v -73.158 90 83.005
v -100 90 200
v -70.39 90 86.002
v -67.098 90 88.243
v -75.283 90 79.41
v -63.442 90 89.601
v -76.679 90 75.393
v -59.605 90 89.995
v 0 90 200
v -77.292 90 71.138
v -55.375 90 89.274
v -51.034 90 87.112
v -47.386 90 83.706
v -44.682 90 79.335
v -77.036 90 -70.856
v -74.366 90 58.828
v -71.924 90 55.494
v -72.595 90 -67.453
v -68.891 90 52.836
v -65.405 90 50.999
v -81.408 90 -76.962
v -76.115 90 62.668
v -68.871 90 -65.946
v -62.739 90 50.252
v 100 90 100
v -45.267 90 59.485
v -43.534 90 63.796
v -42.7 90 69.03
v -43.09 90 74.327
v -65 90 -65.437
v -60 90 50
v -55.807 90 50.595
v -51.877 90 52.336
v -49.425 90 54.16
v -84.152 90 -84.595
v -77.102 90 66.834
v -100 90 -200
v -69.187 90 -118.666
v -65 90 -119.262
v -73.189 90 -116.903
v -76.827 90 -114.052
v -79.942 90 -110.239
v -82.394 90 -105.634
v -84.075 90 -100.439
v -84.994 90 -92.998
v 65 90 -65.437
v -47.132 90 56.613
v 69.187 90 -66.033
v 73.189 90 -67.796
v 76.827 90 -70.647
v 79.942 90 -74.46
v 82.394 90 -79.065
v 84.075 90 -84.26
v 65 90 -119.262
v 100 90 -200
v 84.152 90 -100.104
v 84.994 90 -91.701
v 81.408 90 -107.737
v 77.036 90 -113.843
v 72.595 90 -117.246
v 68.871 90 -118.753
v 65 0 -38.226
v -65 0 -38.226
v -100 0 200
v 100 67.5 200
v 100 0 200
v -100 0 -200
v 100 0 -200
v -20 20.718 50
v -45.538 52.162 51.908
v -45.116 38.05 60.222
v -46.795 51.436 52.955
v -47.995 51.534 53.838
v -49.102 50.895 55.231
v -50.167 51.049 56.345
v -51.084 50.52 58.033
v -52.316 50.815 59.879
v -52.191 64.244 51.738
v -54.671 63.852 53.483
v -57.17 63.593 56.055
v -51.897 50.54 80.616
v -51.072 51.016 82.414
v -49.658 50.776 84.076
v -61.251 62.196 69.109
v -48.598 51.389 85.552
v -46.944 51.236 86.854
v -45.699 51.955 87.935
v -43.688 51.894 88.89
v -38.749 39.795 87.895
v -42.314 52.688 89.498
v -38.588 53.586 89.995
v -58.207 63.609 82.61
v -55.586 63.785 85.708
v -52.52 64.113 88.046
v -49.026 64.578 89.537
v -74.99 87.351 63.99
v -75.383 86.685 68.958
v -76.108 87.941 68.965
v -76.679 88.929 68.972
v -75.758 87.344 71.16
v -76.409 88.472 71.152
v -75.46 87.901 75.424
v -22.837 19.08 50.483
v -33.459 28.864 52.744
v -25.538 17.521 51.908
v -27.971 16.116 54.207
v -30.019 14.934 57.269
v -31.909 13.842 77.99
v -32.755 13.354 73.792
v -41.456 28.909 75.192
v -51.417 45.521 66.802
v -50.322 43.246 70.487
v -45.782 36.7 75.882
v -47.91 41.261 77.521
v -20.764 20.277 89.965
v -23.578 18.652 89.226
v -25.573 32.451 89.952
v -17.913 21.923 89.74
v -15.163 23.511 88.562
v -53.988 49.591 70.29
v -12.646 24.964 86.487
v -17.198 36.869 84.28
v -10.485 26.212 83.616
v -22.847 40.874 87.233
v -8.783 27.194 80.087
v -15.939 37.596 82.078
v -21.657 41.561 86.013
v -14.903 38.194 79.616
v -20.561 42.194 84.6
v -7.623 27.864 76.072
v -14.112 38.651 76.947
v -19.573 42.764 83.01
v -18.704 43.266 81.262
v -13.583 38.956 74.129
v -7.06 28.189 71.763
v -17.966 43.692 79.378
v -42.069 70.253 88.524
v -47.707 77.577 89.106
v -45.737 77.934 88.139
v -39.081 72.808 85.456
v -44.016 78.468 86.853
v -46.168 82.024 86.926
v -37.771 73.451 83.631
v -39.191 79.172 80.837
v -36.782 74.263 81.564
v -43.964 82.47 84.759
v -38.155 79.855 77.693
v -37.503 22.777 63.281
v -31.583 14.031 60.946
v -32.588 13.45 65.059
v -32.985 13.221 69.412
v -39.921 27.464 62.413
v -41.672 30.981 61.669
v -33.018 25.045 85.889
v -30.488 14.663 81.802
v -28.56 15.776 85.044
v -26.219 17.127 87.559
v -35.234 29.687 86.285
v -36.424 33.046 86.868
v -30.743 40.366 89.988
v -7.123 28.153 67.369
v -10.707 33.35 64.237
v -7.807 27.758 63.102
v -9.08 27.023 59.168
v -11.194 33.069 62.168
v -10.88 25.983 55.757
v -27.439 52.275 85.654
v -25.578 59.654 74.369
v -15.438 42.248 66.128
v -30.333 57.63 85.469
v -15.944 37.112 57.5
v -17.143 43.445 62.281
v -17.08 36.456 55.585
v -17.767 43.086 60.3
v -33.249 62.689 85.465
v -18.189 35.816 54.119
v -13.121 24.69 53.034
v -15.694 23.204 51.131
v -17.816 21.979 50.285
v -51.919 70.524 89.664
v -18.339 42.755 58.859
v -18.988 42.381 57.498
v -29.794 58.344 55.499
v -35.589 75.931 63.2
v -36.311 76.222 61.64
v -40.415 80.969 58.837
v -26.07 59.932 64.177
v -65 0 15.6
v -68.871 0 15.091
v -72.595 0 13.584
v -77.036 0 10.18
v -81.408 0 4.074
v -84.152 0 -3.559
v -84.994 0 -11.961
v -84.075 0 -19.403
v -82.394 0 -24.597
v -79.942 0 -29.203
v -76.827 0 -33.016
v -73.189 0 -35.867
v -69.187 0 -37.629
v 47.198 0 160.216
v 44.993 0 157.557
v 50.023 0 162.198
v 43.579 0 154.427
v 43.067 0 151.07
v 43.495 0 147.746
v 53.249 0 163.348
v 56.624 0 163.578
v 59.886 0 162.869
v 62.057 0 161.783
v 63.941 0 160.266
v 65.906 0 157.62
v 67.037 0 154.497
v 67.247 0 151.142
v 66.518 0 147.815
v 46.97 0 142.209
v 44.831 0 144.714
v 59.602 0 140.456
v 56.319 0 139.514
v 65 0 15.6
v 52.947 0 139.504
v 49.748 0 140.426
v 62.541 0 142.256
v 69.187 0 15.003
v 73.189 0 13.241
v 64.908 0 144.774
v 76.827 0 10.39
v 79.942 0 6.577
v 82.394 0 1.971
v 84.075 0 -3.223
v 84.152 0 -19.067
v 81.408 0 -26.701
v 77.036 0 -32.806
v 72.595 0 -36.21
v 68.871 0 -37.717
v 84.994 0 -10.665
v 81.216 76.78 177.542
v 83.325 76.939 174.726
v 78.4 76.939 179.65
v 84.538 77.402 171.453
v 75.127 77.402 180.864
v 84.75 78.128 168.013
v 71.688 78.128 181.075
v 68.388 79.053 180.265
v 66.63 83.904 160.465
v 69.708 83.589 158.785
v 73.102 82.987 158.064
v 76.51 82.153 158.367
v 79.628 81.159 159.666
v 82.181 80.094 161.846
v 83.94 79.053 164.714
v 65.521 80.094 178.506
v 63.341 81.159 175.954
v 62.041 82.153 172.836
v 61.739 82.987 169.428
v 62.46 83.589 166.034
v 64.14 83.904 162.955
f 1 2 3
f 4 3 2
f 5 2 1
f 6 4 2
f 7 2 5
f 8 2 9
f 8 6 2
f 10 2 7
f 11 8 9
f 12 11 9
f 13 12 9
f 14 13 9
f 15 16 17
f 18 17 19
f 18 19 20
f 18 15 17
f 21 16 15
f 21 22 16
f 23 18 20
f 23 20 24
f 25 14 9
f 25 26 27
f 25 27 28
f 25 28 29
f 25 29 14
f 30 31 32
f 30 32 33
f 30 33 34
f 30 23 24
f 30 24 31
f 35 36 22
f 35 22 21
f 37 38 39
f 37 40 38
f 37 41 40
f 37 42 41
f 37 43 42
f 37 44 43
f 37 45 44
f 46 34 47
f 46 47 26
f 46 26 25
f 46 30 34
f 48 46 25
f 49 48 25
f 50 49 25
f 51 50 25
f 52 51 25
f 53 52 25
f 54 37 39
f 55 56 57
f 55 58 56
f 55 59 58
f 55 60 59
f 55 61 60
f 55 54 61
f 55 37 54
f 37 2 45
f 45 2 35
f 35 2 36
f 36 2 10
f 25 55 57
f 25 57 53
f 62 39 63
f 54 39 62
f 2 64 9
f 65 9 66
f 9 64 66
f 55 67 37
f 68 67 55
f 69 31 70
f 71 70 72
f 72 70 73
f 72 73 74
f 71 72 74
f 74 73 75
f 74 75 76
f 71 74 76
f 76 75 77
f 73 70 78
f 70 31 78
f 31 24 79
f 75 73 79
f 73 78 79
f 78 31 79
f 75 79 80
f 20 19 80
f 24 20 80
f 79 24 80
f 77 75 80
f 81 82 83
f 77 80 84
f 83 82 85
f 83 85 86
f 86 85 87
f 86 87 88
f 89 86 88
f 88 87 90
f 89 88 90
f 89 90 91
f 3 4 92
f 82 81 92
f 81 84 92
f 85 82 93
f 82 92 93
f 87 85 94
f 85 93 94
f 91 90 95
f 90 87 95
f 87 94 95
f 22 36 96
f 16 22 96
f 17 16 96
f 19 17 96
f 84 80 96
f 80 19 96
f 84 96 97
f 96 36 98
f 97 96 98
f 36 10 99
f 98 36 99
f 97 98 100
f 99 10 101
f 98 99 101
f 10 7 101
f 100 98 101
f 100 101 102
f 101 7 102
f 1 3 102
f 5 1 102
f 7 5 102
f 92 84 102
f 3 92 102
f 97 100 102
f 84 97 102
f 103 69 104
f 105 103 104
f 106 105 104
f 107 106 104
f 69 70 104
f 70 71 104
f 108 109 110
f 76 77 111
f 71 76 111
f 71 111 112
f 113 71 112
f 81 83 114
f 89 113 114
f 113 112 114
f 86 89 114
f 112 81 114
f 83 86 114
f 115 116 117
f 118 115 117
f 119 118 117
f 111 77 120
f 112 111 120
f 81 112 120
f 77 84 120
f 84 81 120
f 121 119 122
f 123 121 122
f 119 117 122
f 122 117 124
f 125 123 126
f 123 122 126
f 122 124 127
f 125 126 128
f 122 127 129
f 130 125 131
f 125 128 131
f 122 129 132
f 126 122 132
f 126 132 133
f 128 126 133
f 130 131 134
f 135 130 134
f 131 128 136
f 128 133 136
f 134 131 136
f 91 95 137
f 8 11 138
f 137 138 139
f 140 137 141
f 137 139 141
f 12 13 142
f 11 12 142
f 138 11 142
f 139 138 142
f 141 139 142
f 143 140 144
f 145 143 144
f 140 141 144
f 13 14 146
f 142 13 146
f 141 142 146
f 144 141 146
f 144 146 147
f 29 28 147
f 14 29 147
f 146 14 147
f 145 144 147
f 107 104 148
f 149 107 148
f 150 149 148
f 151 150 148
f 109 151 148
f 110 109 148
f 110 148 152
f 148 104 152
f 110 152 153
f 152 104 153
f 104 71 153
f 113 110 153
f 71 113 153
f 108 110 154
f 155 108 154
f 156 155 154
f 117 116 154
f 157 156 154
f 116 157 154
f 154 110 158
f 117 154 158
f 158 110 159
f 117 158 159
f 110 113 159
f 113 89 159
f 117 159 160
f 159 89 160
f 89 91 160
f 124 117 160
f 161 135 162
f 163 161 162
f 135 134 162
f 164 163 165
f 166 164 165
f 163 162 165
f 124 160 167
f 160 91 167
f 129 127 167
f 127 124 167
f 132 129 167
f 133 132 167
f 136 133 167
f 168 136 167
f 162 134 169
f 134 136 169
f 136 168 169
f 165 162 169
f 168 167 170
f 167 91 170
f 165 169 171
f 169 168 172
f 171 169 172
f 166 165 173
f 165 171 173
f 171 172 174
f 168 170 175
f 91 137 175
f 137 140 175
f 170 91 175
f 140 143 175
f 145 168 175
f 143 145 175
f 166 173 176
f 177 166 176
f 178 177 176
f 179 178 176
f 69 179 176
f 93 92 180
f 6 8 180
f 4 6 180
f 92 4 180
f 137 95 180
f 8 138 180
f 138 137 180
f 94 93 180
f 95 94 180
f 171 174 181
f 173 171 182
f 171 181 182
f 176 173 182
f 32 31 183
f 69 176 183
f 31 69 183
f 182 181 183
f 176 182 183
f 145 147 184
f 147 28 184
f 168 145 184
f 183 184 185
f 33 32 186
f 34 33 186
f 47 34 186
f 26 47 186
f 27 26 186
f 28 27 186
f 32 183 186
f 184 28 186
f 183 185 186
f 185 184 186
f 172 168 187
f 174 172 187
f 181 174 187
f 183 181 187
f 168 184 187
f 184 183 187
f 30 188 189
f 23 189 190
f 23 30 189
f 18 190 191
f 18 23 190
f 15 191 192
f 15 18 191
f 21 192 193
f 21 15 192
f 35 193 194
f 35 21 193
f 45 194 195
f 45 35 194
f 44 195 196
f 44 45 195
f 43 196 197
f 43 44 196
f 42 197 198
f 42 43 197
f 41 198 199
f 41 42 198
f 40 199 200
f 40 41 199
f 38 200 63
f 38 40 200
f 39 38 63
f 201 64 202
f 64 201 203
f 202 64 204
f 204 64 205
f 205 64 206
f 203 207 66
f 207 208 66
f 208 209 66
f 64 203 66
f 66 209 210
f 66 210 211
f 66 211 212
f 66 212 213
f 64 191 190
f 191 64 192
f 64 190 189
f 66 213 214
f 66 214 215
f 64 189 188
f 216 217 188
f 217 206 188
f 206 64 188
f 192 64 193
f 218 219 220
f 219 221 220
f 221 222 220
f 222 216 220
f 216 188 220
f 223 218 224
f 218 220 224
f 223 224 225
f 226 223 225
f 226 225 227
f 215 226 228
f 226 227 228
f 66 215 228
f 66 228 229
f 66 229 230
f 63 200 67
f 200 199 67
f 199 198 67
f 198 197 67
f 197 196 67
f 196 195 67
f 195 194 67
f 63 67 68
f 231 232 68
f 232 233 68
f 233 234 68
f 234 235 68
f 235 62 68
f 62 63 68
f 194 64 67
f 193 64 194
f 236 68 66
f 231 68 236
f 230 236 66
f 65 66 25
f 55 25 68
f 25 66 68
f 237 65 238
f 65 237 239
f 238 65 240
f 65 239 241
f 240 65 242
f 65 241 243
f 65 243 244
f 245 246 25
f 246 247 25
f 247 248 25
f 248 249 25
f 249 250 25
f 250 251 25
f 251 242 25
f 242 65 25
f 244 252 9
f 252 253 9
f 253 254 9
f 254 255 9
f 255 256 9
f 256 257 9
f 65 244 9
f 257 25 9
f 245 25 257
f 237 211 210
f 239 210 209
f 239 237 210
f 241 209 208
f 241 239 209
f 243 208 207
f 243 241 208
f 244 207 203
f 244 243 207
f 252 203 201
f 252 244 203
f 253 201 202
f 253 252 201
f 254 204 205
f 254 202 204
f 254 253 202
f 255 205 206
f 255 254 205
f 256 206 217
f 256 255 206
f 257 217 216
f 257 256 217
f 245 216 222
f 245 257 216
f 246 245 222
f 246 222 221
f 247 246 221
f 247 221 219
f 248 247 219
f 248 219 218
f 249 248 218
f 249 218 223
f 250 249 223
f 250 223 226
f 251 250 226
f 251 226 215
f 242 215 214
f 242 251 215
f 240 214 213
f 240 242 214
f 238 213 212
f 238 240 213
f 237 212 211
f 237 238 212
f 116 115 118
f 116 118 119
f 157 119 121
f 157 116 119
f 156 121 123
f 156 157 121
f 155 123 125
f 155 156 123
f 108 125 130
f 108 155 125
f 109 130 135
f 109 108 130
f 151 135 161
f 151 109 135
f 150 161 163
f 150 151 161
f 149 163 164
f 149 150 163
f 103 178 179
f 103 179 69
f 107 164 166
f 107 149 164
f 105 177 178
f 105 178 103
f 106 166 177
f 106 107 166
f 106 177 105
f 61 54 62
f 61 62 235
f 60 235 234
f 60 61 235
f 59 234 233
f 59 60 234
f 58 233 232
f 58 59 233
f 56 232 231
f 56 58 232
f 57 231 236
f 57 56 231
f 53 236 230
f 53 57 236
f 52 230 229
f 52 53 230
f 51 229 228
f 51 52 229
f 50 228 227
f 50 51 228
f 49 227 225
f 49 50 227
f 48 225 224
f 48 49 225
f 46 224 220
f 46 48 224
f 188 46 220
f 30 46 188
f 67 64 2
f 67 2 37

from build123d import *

# Parameters (mm, degrees)
SKETCH1_W           = 200
SKETCH1_H           = 400
BOSS_EXTRUDE1_DEPTH = 90
CUT_EXTRUDE2_DEPTH  = 289.26854046
SKETCH4_3_R         = 11.813497964
CUT_EXTRUDE4_DEPTH  = 289.26854046
SKETCH10_RX         = 20
SKETCH10_RY         = 15
CUT_EXTRUDE5_DEPTH  = 100
CUT_EXTRUDE6_DEPTH  = 380.479144091


with BuildPart() as part:
    # Sketch1 → Boss-Extrude1 (new body)
    with BuildSketch(Plane(origin=(0, 0, 0), x_dir=(1, 0, 0), z_dir=(0, 1, 0))):
        Rectangle(SKETCH1_W, SKETCH1_H)
    extrude(amount=BOSS_EXTRUDE1_DEPTH)

    # Sketch4 → Cut-Extrude2 (cut, through all)
    with BuildSketch(Plane(origin=(27.582292849, 122.587968218, 27.582292849), x_dir=(-0.9767443431718839, 0.20917784862693525, 0.04706501594106042), z_dir=(-0.21440729484260865, -0.9529213104115941, -0.21440729484260865))):
        Polygon((28.239009565, -175.365853659), (-74.141926347, -77.804878049), (-74.141926347, -180.304878049), align=None)
    extrude(amount=-CUT_EXTRUDE2_DEPTH, mode=Mode.SUBTRACT)

    # Sketch4<3> → Cut-Extrude4 (cut, through all)
    with BuildSketch(Plane(origin=(27.582292849, 122.587968218, 27.582292849), x_dir=(-0.9767443431718839, 0.20917784862693525, 0.04706501594106042), z_dir=(-0.21440729484260865, -0.9529213104115941, -0.21440729484260865))):
        with Locations((-46.760990435, -147.804878049)):
            Circle(SKETCH4_3_R)
    extrude(amount=CUT_EXTRUDE4_DEPTH, mode=Mode.SUBTRACT)

    # Sketch10 → Cut-Extrude5 (cut)
    with BuildSketch(Plane(origin=(-63.97114317, 110.801270189, 0), x_dir=(0, 0, 1), z_dir=(-0.500000000000001, 0.866025403784438, 0))):
        with Locations(Location((70, -6.961524227), (0, 0, 180))):
            Ellipse(SKETCH10_RX, SKETCH10_RY)
    extrude(amount=-CUT_EXTRUDE5_DEPTH, mode=Mode.SUBTRACT)

    # Sketch11 → Cut-Extrude6 (cut, through all)
    with BuildSketch(Plane(origin=(0, 149.155970384, -134.300638965), x_dir=(-1, 0, 0), z_dir=(0, 0.7431448254773932, -0.6691306063588595))):
        with BuildLine():
            Line((-65, 11.592789477), (65, 11.592789477))
            ThreePointArc((65, 11.592789477), (85, -8.407210523), (65, -28.407210523))
            Line((65, -28.407210523), (-65, -28.407210523))
            ThreePointArc((-65, -28.407210523), (-85, -8.407210523), (-65, 11.592789477))
        make_face()
    extrude(amount=-CUT_EXTRUDE6_DEPTH, mode=Mode.SUBTRACT)


solid = part.part
